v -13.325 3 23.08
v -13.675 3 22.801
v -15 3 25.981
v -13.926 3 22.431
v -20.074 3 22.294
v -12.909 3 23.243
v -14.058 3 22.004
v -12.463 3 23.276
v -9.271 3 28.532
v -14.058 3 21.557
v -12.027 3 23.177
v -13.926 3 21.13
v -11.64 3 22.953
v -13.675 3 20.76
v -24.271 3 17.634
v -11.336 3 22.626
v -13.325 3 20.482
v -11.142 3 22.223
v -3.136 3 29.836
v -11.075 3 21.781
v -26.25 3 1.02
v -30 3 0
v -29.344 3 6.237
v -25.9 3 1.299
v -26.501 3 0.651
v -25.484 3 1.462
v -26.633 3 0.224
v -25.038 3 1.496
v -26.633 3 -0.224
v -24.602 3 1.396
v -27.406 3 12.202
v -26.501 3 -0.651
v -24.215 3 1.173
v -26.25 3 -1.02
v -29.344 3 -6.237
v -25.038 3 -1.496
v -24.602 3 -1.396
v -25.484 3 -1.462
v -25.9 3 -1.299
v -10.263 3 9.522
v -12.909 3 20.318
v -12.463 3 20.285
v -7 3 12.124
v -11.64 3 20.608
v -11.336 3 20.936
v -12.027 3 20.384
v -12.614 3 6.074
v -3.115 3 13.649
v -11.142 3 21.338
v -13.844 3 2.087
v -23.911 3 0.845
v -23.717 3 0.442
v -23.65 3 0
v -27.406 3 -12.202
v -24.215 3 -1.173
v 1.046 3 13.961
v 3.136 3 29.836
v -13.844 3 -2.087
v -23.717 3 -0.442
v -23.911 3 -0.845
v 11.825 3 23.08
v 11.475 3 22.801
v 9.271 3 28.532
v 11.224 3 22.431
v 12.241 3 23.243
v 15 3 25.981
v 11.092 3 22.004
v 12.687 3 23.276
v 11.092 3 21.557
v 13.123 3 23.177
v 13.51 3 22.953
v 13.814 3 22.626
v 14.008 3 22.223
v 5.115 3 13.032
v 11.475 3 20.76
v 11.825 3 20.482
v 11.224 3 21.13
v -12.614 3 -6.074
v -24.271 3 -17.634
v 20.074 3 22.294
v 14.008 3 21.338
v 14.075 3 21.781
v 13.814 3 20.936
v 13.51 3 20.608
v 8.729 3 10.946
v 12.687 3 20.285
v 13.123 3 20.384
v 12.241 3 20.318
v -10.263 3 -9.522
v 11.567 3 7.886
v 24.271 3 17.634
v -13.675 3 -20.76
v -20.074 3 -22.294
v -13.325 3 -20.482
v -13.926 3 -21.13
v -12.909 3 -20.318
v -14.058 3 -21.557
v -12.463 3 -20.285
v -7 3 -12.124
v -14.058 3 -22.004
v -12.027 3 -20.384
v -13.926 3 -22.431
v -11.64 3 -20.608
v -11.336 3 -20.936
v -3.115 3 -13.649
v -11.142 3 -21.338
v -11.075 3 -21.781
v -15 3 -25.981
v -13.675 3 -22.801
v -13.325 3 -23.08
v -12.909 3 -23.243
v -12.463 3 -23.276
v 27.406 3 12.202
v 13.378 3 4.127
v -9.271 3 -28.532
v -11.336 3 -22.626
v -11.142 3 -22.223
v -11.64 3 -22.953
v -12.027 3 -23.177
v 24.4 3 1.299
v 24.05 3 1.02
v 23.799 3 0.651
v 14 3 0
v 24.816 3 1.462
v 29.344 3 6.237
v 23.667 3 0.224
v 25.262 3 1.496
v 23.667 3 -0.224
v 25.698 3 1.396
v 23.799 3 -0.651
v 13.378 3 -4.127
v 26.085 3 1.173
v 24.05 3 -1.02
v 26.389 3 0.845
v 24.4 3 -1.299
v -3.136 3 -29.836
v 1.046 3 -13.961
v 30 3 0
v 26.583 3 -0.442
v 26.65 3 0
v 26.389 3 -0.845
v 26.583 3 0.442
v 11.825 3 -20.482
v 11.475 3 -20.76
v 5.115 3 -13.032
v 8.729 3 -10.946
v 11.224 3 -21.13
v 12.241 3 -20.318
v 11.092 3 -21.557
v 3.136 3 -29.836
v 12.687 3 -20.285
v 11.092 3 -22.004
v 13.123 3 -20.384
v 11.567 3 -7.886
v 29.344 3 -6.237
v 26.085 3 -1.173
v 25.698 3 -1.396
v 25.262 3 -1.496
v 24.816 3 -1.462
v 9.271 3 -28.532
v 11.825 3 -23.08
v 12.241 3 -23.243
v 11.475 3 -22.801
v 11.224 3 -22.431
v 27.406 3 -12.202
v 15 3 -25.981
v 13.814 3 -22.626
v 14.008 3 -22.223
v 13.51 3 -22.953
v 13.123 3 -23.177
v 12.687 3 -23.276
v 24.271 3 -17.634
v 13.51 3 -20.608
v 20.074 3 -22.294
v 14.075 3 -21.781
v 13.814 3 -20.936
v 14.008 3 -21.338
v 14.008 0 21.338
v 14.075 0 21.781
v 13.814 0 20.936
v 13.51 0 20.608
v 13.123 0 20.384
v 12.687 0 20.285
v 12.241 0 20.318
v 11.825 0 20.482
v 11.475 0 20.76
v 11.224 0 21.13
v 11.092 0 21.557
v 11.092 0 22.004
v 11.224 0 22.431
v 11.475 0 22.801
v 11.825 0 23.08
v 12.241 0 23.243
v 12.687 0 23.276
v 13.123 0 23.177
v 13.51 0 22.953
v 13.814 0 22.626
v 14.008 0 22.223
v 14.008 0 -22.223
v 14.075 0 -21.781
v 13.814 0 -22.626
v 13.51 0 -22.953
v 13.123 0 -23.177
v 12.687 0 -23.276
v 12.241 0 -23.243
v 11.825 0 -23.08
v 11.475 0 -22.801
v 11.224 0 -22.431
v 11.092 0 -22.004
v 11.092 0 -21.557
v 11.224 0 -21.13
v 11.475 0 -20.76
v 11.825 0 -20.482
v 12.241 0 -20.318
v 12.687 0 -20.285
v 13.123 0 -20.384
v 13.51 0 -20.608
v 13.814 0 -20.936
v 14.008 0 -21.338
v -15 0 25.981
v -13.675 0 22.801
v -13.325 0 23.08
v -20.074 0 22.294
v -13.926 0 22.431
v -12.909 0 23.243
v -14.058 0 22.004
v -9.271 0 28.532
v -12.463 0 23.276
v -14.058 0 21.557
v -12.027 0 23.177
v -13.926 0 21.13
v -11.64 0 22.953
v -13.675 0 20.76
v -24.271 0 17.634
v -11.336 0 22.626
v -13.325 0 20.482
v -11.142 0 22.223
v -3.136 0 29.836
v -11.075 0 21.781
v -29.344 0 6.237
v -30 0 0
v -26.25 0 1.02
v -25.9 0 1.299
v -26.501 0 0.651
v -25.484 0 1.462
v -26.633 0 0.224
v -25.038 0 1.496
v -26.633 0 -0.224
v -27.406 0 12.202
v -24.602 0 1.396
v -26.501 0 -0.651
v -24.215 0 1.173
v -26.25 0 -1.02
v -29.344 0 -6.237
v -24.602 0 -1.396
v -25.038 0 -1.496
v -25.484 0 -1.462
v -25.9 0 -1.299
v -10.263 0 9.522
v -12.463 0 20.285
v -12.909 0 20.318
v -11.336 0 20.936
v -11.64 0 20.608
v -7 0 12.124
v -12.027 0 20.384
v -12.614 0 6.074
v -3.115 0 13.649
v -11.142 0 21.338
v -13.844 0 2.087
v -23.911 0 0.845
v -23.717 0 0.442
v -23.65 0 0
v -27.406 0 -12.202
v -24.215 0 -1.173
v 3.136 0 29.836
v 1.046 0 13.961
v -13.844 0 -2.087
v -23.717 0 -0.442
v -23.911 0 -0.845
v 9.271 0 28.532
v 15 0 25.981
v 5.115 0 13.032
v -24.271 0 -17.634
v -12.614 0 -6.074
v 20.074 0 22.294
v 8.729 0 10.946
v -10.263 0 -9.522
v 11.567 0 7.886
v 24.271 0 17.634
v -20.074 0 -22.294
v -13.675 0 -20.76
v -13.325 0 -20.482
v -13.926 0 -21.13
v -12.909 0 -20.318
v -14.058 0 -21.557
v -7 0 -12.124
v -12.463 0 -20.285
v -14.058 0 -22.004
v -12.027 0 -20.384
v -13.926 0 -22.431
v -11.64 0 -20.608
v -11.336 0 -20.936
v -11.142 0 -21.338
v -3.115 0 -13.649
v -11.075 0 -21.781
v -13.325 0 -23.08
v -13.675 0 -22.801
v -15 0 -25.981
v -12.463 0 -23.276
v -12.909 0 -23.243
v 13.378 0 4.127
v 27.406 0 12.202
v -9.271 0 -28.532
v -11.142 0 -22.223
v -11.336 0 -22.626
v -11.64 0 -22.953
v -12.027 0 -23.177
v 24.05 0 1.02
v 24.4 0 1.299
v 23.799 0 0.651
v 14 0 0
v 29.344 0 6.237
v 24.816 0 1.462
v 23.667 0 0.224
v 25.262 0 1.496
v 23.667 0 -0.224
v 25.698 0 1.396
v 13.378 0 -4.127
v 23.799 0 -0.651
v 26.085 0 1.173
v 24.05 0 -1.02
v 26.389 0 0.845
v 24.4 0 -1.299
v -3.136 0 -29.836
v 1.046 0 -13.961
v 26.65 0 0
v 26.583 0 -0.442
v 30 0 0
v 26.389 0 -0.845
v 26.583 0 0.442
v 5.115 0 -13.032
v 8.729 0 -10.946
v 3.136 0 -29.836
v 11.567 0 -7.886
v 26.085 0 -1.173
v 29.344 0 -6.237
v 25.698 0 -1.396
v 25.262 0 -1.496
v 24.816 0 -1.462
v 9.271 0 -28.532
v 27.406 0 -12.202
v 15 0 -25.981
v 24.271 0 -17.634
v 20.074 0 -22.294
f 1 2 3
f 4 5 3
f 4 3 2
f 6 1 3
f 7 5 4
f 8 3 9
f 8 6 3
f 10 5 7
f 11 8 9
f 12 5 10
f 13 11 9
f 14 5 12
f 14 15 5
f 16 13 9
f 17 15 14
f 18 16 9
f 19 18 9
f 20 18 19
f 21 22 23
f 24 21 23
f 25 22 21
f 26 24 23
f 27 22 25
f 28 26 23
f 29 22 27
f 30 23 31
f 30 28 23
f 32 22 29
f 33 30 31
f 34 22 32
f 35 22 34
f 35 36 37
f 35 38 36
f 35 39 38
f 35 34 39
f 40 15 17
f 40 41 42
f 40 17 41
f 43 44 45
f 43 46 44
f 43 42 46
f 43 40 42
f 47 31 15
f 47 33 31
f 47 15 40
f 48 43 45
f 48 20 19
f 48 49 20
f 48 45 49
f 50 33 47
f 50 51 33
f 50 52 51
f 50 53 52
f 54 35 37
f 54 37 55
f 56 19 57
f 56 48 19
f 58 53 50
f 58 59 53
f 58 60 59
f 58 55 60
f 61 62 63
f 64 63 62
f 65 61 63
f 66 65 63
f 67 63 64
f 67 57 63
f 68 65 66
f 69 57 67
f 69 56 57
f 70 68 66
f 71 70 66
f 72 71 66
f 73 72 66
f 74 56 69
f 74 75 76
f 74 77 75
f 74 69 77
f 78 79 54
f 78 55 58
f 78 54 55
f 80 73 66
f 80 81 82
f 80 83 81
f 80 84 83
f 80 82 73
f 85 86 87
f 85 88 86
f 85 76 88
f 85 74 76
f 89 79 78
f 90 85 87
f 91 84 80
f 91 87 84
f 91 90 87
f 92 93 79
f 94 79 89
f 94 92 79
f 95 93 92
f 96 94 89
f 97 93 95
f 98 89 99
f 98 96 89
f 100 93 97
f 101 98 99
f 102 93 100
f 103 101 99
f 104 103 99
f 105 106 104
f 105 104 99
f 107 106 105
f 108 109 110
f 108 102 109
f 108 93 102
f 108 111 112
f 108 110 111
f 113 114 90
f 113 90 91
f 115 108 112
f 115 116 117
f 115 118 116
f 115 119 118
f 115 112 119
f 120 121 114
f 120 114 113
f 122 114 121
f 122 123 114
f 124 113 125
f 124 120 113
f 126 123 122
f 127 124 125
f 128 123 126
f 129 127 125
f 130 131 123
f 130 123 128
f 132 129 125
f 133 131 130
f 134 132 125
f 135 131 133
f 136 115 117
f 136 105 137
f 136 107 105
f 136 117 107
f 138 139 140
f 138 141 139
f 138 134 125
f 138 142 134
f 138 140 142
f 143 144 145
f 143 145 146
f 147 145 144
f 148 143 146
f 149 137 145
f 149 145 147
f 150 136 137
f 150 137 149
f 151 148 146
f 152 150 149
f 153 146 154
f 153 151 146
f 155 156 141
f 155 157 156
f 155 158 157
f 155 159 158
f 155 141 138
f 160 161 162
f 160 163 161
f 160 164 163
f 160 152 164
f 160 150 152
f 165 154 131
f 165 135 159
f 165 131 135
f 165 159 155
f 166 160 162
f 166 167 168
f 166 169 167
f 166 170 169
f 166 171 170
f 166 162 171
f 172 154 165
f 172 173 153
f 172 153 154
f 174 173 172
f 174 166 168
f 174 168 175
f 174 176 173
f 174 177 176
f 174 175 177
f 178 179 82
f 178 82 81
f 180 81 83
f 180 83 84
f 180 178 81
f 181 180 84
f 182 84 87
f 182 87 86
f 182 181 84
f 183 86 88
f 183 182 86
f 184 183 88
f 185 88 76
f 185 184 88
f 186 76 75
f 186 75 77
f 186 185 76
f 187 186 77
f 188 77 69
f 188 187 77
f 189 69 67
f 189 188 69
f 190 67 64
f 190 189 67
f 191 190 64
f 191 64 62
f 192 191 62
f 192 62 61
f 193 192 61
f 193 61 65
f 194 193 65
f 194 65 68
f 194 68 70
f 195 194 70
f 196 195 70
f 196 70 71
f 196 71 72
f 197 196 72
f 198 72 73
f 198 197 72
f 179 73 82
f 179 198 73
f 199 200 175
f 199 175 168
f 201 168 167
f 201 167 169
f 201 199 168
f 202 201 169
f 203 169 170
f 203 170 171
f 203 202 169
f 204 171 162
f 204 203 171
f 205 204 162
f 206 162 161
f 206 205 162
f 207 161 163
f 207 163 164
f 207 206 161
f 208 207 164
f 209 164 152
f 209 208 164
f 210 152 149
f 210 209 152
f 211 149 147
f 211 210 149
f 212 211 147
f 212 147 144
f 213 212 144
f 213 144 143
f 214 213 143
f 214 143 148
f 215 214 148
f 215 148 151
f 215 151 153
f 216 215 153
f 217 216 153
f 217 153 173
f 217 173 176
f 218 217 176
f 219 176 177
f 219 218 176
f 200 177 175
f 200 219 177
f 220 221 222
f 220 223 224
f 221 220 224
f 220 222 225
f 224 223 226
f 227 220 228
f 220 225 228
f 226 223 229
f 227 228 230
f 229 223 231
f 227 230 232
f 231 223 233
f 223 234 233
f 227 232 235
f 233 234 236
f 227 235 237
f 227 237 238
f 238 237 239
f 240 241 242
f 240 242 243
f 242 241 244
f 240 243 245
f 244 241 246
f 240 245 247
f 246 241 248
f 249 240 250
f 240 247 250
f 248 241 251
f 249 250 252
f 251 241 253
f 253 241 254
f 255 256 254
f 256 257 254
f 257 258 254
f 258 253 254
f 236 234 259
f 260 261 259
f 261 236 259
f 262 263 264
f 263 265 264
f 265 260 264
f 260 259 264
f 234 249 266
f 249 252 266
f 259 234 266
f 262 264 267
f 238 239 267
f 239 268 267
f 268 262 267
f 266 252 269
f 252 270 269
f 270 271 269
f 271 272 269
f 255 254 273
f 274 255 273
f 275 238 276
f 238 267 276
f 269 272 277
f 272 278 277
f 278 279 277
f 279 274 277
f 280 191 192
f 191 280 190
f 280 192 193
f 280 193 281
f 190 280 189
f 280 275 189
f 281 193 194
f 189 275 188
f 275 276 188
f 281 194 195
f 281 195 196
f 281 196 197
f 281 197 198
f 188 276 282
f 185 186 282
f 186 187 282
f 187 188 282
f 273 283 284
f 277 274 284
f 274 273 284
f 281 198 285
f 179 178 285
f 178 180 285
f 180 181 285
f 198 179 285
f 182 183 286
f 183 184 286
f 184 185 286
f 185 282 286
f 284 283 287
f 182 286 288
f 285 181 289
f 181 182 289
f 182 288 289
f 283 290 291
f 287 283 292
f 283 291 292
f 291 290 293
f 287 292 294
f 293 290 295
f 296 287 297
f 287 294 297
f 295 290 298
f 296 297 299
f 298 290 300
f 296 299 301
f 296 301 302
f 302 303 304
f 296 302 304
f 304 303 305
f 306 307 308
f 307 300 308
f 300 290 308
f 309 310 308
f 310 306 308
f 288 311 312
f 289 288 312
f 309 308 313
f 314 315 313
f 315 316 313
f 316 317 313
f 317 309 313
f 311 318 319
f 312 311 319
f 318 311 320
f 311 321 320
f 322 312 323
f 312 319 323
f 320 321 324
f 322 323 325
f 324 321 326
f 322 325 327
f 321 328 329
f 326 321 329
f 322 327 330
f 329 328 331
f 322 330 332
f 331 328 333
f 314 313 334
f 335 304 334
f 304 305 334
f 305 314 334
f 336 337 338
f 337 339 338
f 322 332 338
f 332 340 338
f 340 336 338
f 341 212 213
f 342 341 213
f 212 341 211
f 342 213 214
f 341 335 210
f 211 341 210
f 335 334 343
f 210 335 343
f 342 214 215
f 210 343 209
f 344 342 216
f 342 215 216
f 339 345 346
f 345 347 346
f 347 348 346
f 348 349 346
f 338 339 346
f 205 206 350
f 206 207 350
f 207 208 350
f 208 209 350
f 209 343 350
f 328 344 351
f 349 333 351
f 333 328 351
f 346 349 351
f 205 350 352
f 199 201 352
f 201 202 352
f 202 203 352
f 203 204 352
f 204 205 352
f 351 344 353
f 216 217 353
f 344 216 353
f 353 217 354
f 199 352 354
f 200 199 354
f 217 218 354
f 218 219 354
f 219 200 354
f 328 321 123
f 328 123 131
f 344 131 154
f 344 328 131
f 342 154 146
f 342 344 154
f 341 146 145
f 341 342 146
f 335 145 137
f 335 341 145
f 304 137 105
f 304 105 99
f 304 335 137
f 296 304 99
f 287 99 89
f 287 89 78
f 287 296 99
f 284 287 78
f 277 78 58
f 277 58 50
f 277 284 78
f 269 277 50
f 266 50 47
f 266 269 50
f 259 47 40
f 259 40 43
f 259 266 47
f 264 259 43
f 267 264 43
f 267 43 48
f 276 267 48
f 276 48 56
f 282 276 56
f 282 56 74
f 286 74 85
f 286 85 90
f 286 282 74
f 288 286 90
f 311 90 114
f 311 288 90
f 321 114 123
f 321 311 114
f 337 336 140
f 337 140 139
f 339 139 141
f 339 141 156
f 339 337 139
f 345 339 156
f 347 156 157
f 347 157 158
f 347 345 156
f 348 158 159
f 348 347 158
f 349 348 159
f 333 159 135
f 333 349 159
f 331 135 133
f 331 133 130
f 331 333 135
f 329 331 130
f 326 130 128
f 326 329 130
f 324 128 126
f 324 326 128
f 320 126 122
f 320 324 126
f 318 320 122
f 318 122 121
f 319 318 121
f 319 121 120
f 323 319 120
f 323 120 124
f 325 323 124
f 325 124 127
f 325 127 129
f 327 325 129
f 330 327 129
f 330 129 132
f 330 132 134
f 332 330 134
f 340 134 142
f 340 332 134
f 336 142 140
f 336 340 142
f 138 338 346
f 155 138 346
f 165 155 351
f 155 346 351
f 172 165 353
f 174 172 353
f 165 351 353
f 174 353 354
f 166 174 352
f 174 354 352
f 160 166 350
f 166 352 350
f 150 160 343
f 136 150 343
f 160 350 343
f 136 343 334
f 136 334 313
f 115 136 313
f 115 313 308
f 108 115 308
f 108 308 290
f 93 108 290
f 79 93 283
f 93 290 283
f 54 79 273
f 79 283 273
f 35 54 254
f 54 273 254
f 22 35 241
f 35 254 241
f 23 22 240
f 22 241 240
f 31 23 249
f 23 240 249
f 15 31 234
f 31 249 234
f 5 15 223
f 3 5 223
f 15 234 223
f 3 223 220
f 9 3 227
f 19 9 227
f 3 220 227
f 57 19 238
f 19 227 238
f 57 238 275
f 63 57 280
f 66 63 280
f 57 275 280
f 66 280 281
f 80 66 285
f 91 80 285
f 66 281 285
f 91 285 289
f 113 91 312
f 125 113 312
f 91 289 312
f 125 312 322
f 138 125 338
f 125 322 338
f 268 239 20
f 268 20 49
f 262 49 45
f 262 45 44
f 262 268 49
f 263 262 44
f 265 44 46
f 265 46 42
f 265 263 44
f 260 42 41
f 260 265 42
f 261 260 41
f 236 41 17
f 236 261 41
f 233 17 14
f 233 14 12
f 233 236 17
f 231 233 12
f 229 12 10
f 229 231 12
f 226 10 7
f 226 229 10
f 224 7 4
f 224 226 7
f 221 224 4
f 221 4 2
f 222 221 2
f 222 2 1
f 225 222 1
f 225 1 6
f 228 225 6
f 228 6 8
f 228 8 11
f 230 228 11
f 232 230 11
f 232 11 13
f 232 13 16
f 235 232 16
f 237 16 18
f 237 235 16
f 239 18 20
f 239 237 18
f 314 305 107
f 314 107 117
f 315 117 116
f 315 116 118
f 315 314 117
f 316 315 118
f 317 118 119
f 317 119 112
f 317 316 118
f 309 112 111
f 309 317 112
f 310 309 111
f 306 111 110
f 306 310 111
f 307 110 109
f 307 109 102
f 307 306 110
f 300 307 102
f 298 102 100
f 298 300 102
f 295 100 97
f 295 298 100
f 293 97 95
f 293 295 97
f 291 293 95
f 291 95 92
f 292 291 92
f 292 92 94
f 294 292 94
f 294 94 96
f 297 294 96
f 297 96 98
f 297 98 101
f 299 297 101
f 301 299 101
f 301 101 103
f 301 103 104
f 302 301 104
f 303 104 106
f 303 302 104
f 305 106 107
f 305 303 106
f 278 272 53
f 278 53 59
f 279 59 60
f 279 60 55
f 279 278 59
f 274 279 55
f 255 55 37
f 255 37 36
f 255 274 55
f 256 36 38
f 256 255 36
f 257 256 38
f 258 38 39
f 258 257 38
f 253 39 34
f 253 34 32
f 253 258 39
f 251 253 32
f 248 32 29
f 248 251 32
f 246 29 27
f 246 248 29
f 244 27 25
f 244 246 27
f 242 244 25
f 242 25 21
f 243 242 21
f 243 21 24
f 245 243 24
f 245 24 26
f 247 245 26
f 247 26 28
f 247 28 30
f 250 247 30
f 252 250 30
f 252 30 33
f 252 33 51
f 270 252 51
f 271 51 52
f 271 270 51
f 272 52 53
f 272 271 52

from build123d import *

# Parameters (mm, degrees)
SKETCH1_R           = 30
SKETCH1_R_2         = 1.5
SKETCH1_R_3         = 14
BOSS_EXTRUDE1_DEPTH = 3


with BuildPart() as part:
    # Sketch1 → Boss-Extrude1 (new body)
    with BuildSketch(Plane(origin=(0, 0, 0), x_dir=(1, 0, 0), z_dir=(0, 1, 0))):
        Circle(SKETCH1_R)
        with Locations((-25.15, 0)):
            Circle(SKETCH1_R_2, mode=Mode.SUBTRACT)
        Circle(SKETCH1_R_3, mode=Mode.SUBTRACT)
        with Locations((-12.575, 21.780538905)):
            Circle(SKETCH1_R_2, mode=Mode.SUBTRACT)
        with Locations((12.575, 21.780538905)):
            Circle(SKETCH1_R_2, mode=Mode.SUBTRACT)
        with Locations((25.15, 0)):
            Circle(SKETCH1_R_2, mode=Mode.SUBTRACT)
        with Locations((12.575, -21.780538905)):
            Circle(SKETCH1_R_2, mode=Mode.SUBTRACT)
        with Locations((-12.575, -21.780538905)):
            Circle(SKETCH1_R_2, mode=Mode.SUBTRACT)
    extrude(amount=BOSS_EXTRUDE1_DEPTH)


solid = part.part
